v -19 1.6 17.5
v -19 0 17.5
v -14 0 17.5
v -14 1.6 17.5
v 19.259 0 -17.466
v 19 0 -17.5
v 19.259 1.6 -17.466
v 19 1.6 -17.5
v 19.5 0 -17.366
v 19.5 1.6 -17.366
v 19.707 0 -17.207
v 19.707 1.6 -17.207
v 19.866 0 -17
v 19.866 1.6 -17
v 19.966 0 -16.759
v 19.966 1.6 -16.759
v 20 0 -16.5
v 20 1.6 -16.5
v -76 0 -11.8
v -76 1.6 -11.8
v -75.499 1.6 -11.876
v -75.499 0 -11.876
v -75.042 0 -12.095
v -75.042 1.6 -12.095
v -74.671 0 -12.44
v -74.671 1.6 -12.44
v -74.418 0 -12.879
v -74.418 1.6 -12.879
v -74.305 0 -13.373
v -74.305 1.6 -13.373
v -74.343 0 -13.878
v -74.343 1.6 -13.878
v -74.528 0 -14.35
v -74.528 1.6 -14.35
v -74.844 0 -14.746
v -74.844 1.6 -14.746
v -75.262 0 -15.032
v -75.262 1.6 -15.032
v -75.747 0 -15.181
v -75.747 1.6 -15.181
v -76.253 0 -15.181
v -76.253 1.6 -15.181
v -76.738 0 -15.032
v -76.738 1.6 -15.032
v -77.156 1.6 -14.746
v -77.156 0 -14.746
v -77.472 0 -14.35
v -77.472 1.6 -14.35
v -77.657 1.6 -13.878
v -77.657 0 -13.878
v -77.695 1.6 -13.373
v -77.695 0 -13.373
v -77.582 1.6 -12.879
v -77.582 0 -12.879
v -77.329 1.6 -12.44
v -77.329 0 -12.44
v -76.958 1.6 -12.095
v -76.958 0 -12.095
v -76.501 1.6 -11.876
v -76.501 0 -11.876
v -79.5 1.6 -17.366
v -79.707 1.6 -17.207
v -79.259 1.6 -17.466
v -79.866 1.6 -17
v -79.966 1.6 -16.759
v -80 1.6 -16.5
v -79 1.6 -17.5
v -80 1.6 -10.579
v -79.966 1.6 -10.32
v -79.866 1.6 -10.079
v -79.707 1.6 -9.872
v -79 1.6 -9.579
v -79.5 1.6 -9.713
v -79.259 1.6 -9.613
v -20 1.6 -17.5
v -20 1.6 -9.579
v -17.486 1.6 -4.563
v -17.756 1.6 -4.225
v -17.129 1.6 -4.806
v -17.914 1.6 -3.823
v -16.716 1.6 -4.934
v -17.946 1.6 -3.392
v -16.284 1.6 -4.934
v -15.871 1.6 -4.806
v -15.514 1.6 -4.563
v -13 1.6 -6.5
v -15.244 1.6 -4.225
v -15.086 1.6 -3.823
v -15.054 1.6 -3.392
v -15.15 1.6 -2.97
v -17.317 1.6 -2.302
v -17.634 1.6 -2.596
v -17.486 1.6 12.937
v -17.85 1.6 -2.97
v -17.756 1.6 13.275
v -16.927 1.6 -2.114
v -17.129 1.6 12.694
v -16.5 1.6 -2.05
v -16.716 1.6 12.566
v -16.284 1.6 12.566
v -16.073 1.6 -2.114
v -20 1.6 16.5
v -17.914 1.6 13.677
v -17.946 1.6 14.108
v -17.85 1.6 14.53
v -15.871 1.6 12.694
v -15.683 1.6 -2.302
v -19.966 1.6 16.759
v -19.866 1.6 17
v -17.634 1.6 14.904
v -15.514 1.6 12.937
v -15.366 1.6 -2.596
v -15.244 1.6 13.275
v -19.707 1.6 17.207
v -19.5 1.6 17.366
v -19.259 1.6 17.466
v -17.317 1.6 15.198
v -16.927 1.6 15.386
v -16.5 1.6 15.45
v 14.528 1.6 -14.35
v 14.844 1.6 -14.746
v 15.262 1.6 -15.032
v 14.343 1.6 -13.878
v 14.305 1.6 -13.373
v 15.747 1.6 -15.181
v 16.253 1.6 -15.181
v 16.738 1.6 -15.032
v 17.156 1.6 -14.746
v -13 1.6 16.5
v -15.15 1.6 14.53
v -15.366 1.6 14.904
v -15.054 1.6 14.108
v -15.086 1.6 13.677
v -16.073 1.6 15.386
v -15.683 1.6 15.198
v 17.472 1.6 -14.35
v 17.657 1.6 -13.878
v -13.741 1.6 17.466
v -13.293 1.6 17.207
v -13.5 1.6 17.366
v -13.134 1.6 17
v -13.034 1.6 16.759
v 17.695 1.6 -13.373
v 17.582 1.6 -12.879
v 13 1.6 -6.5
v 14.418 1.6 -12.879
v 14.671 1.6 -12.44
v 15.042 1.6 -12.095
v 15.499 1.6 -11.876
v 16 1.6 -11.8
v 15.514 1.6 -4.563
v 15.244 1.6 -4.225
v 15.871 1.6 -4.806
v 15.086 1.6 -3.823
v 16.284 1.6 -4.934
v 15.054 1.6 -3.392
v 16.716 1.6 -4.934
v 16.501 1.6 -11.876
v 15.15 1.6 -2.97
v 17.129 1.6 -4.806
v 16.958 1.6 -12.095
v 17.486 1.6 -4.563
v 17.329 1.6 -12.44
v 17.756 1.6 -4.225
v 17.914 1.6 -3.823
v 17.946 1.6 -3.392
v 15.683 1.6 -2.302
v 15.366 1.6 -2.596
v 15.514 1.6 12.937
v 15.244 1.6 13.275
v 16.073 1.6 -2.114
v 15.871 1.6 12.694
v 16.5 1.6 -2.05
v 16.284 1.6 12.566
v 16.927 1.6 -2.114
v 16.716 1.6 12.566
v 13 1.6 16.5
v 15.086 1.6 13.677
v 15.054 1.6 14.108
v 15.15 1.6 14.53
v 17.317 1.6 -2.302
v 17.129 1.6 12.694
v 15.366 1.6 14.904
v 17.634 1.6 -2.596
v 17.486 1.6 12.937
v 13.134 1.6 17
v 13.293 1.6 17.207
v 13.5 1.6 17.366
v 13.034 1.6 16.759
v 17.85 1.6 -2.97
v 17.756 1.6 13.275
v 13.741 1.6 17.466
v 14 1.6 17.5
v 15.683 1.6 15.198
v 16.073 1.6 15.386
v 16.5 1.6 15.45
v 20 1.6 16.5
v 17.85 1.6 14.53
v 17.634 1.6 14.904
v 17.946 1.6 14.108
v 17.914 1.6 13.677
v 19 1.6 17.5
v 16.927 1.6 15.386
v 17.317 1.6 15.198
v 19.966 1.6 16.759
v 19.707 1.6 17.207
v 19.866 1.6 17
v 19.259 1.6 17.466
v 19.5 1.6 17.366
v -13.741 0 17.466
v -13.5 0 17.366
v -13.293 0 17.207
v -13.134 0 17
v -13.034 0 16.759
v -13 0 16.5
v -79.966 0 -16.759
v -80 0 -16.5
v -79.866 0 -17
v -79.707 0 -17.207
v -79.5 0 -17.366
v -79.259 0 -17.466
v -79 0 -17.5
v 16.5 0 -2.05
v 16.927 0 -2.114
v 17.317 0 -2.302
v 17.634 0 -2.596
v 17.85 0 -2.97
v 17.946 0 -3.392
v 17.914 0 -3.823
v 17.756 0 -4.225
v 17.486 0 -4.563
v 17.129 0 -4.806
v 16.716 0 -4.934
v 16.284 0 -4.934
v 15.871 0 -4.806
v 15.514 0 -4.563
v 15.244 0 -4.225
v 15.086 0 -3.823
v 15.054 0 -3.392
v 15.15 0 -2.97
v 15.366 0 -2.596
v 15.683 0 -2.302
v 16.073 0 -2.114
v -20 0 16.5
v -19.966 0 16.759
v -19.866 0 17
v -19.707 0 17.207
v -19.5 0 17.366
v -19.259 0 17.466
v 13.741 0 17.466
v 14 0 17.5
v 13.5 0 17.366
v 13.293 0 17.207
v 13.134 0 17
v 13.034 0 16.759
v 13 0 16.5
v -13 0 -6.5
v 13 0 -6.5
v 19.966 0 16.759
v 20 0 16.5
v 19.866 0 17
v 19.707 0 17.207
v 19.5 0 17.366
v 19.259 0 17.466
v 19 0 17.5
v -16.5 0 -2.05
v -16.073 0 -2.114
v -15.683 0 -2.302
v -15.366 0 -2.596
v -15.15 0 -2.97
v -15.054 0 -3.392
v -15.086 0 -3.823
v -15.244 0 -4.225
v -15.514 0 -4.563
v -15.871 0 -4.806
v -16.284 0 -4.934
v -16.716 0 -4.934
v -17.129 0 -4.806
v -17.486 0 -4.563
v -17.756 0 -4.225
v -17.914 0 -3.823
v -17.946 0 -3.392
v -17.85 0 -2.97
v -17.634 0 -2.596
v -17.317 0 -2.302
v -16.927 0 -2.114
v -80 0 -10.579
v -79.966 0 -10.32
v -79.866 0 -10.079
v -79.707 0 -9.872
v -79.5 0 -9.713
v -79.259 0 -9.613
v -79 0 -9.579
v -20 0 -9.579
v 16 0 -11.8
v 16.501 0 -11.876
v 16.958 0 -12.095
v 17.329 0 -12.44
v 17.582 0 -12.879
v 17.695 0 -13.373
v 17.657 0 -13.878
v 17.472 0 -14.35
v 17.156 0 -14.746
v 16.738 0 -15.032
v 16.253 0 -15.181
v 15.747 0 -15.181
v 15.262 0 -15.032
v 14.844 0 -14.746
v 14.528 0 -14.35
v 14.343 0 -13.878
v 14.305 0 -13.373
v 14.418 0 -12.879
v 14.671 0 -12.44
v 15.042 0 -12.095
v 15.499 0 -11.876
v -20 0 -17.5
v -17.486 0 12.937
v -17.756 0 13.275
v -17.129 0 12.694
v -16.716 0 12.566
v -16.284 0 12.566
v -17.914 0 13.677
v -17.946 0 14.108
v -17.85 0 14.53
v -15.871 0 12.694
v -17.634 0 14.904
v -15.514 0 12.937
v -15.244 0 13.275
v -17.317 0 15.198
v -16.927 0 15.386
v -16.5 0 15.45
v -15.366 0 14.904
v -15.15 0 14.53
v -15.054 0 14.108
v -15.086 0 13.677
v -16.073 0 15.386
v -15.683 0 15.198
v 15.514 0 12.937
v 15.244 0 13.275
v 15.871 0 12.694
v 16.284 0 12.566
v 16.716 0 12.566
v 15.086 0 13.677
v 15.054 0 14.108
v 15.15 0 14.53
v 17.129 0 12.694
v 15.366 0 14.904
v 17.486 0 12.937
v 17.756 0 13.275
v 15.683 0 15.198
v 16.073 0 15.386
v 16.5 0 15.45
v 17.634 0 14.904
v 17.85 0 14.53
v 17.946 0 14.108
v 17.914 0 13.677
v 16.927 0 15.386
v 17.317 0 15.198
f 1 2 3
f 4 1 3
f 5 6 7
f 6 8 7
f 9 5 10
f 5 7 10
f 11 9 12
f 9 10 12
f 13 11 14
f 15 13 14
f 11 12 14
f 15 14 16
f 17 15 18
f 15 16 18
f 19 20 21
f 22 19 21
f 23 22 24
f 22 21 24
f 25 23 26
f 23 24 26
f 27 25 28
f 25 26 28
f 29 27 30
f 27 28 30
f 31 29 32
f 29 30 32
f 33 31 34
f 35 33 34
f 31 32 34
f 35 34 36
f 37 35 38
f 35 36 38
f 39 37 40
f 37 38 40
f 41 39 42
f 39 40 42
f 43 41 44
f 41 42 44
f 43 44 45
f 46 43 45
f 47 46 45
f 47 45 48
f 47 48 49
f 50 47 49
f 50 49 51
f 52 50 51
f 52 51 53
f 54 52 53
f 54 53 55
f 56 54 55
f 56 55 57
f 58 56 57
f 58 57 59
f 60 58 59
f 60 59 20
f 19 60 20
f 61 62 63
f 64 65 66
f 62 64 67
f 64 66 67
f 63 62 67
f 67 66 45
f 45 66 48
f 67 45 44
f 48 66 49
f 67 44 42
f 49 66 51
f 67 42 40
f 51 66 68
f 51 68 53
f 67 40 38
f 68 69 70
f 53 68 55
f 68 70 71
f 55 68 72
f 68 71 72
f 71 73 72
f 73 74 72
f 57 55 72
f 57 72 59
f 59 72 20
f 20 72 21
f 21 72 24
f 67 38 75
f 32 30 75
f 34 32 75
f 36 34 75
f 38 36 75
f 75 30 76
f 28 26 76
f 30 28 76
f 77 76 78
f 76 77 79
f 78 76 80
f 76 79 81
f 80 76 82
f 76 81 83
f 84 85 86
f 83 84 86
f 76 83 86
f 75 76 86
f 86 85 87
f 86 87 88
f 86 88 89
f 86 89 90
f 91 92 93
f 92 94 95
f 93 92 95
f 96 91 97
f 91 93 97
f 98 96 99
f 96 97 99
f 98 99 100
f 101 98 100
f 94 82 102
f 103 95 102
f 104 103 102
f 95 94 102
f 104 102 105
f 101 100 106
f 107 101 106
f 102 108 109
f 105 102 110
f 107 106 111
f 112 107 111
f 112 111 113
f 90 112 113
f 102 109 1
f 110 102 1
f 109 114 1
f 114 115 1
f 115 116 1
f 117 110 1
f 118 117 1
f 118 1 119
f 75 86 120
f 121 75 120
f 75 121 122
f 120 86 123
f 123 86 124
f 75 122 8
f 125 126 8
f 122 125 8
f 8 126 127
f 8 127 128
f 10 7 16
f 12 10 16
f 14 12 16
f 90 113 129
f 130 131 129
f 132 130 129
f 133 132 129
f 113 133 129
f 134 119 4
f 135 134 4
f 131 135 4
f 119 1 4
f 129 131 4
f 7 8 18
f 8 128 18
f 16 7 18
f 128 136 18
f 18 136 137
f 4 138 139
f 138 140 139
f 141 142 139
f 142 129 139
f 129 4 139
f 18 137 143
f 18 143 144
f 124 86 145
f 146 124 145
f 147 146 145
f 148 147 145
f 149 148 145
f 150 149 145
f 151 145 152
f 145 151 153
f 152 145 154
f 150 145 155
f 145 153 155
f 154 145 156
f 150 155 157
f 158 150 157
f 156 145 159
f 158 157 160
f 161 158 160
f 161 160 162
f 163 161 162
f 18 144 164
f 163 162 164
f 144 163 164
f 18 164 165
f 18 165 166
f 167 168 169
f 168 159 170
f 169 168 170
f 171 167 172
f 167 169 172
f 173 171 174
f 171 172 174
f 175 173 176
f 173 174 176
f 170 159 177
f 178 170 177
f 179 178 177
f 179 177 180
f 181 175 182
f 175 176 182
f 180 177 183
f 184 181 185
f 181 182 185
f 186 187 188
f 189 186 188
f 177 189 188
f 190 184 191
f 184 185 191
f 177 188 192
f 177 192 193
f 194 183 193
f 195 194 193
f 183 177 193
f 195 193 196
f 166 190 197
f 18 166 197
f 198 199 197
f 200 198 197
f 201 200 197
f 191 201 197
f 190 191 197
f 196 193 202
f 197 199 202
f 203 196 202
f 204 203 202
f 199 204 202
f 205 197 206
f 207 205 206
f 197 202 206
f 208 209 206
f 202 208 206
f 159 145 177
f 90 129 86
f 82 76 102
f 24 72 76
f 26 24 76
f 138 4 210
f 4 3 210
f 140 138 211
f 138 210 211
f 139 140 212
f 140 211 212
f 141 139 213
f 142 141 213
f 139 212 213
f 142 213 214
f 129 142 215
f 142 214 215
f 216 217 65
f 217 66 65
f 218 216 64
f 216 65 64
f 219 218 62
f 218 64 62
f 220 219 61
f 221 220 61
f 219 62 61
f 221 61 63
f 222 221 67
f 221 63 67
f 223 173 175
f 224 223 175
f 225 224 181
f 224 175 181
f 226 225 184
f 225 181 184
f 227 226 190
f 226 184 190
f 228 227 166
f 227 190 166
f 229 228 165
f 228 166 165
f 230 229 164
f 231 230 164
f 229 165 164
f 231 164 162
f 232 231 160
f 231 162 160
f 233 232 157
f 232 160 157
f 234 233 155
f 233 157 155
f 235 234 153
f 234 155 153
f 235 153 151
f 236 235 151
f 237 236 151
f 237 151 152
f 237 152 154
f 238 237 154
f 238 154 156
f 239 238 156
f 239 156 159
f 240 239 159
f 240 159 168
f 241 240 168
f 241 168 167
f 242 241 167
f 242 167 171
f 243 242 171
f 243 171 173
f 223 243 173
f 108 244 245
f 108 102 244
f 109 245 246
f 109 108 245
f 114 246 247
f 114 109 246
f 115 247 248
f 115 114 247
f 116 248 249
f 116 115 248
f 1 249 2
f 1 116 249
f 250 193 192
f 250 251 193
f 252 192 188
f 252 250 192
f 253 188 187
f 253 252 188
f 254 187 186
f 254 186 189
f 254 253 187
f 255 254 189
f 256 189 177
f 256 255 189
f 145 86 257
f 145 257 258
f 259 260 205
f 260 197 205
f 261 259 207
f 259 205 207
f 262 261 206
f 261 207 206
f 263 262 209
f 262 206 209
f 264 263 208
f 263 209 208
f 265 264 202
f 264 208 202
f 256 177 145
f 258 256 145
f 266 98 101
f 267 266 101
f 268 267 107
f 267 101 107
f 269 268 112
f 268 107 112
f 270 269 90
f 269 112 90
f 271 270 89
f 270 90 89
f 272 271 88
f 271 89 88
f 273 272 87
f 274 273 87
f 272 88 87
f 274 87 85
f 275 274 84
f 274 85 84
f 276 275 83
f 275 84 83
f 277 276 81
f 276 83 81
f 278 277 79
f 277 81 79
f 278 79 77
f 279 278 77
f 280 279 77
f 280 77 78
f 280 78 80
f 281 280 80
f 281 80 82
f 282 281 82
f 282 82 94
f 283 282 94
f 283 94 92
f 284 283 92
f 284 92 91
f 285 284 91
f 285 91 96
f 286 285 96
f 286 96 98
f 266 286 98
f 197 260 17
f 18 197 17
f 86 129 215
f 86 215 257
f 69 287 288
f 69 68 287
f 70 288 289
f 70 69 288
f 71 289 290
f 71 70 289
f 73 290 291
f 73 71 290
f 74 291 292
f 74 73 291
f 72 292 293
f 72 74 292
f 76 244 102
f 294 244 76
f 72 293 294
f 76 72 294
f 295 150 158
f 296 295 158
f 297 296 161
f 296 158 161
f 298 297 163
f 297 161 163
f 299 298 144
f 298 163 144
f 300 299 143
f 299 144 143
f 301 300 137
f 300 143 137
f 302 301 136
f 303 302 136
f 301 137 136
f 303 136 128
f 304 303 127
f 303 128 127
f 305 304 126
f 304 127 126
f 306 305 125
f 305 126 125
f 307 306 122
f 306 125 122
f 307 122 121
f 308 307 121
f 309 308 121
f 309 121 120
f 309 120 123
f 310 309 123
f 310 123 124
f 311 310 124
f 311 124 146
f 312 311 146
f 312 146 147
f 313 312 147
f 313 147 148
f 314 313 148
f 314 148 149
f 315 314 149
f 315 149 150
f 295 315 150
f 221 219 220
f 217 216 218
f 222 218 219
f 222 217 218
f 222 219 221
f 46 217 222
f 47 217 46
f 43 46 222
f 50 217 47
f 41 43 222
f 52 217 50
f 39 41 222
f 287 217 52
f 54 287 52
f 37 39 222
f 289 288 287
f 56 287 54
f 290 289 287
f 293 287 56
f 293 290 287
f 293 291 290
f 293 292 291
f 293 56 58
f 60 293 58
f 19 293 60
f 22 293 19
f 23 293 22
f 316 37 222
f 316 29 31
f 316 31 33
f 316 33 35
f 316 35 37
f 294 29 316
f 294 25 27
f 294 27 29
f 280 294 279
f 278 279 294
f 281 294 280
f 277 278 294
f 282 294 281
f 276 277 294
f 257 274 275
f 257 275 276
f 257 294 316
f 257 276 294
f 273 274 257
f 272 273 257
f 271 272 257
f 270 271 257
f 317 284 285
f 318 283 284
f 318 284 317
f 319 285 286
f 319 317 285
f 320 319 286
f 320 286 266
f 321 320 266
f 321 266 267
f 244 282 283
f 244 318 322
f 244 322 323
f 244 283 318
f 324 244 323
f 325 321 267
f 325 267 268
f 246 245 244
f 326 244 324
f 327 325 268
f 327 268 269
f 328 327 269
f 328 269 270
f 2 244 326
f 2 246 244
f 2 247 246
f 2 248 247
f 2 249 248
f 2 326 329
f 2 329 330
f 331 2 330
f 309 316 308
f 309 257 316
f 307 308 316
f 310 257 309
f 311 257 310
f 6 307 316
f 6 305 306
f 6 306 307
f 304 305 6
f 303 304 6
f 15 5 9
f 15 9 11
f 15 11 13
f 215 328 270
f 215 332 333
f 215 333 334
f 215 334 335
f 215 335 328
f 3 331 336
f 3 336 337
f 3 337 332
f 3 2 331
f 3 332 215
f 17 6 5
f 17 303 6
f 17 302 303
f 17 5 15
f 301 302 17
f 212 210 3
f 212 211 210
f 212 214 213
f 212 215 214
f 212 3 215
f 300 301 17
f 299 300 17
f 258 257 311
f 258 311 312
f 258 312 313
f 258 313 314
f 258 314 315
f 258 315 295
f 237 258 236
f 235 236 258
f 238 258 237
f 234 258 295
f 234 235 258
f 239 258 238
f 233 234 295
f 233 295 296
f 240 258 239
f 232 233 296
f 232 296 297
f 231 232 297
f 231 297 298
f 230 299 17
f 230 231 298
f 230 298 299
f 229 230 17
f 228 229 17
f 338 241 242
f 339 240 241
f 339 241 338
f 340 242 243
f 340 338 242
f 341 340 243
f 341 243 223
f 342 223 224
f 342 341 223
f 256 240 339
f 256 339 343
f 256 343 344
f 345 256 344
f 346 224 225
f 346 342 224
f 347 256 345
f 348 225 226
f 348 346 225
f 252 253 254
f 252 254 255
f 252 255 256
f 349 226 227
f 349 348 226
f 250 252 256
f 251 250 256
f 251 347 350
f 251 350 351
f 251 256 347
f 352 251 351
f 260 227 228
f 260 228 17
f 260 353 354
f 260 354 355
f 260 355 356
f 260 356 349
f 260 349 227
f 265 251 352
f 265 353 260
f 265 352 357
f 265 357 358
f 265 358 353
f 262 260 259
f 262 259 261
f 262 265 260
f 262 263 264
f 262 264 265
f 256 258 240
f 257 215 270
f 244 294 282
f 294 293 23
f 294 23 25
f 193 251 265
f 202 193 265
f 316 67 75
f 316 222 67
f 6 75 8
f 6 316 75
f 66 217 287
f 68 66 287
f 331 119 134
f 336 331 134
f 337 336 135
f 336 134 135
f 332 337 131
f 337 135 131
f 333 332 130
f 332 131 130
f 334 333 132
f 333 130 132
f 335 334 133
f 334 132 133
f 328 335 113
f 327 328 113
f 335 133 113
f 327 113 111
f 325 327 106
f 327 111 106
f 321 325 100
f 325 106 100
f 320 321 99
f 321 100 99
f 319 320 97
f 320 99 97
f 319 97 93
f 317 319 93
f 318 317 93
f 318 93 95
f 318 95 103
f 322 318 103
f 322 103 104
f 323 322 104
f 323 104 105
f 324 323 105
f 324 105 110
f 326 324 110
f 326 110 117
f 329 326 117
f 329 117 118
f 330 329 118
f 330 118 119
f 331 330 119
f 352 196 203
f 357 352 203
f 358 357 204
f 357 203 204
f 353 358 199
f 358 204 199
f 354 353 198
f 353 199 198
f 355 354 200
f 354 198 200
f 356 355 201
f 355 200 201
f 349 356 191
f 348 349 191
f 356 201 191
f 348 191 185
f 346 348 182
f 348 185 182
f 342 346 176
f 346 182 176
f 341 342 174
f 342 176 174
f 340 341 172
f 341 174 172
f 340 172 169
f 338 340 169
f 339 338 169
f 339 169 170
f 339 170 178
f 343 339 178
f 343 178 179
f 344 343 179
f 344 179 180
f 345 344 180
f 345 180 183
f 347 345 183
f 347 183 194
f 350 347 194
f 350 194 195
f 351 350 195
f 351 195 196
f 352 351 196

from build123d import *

# Parameters (mm, degrees)
SKETCH1_W           = 40
SKETCH1_H           = 35
BOSS_EXTRUDE1_DEPTH = 1.6
SKETCH2_R           = 1.45
SKETCH2_W           = 26
SKETCH2_H           = 24
CUT_EXTRUDE1_DEPTH  = 27.623485872
SKETCH4_W           = 60
SKETCH4_H           = 7.921096837
BOSS_EXTRUDE2_DEPTH = 1.6
SKETCH3_R           = 1.7
CUT_EXTRUDE2_DEPTH  = 82.90732568
FILLET1_R           = 1


with BuildPart() as part:
    # Sketch1 → Boss-Extrude1 (new body)
    with BuildSketch(Plane(origin=(0, 0, 0), x_dir=(1, 0, 0), z_dir=(0, 1, 0))):
        Rectangle(SKETCH1_W, SKETCH1_H)
    extrude(amount=BOSS_EXTRUDE1_DEPTH)

    # Sketch2 → Cut-Extrude1 (cut, through all)
    with BuildSketch(Plane(origin=(0, 1.6, 0), x_dir=(1, 0, 0), z_dir=(0, 1, 0))):
        with Locations(Location((-16.5, 3.5, 0), (0, 0, 270))):
            Circle(SKETCH2_R)
        with Locations(Location((-16.5, -14, 0), (0, 0, 270))):
            Circle(SKETCH2_R)
        with Locations(Location((16.5, 3.5, 0), (0, 0, 270))):
            Circle(SKETCH2_R)
        with Locations(Location((16.5, -14, 0), (0, 0, 270))):
            Circle(SKETCH2_R)
        with Locations((0, -5.5)):
            Rectangle(SKETCH2_W, SKETCH2_H)
    extrude(amount=-CUT_EXTRUDE1_DEPTH, mode=Mode.SUBTRACT)

    # Sketch4 → Boss-Extrude2 (add)
    with BuildSketch(Plane.XZ):
        with Locations((-50, -13.539451581)):
            Rectangle(SKETCH4_W, SKETCH4_H)
    extrude(amount=-BOSS_EXTRUDE2_DEPTH)

    # Sketch3 → Cut-Extrude2 (cut, through all)
    with BuildSketch(Plane(origin=(0, 1.6, 0), x_dir=(1, 0, 0), z_dir=(0, 1, 0))):
        with Locations(Location((16, 13.5, 0), (0, 0, 270))):
            Circle(SKETCH3_R)
        with Locations(Location((-76, 13.5, 0), (0, 0, 270))):
            Circle(SKETCH3_R)
    extrude(amount=-CUT_EXTRUDE2_DEPTH, mode=Mode.SUBTRACT)

    # Fillet1
    fillet1_edges = [part.edges().sort_by_distance(p)[0] for p in [
        (-13, 0.8, 17.5),
        (13, 0.8, 17.5),
        (-80, 0.8, -17.5),
        (-80, 0.8, -9.578903163),
        (20, 0.8, 17.5),
        (-20, 0.8, 17.5),
        (20, 0.8, -17.5),
    ]]
    fillet(fillet1_edges, radius=FILLET1_R)


solid = part.part
